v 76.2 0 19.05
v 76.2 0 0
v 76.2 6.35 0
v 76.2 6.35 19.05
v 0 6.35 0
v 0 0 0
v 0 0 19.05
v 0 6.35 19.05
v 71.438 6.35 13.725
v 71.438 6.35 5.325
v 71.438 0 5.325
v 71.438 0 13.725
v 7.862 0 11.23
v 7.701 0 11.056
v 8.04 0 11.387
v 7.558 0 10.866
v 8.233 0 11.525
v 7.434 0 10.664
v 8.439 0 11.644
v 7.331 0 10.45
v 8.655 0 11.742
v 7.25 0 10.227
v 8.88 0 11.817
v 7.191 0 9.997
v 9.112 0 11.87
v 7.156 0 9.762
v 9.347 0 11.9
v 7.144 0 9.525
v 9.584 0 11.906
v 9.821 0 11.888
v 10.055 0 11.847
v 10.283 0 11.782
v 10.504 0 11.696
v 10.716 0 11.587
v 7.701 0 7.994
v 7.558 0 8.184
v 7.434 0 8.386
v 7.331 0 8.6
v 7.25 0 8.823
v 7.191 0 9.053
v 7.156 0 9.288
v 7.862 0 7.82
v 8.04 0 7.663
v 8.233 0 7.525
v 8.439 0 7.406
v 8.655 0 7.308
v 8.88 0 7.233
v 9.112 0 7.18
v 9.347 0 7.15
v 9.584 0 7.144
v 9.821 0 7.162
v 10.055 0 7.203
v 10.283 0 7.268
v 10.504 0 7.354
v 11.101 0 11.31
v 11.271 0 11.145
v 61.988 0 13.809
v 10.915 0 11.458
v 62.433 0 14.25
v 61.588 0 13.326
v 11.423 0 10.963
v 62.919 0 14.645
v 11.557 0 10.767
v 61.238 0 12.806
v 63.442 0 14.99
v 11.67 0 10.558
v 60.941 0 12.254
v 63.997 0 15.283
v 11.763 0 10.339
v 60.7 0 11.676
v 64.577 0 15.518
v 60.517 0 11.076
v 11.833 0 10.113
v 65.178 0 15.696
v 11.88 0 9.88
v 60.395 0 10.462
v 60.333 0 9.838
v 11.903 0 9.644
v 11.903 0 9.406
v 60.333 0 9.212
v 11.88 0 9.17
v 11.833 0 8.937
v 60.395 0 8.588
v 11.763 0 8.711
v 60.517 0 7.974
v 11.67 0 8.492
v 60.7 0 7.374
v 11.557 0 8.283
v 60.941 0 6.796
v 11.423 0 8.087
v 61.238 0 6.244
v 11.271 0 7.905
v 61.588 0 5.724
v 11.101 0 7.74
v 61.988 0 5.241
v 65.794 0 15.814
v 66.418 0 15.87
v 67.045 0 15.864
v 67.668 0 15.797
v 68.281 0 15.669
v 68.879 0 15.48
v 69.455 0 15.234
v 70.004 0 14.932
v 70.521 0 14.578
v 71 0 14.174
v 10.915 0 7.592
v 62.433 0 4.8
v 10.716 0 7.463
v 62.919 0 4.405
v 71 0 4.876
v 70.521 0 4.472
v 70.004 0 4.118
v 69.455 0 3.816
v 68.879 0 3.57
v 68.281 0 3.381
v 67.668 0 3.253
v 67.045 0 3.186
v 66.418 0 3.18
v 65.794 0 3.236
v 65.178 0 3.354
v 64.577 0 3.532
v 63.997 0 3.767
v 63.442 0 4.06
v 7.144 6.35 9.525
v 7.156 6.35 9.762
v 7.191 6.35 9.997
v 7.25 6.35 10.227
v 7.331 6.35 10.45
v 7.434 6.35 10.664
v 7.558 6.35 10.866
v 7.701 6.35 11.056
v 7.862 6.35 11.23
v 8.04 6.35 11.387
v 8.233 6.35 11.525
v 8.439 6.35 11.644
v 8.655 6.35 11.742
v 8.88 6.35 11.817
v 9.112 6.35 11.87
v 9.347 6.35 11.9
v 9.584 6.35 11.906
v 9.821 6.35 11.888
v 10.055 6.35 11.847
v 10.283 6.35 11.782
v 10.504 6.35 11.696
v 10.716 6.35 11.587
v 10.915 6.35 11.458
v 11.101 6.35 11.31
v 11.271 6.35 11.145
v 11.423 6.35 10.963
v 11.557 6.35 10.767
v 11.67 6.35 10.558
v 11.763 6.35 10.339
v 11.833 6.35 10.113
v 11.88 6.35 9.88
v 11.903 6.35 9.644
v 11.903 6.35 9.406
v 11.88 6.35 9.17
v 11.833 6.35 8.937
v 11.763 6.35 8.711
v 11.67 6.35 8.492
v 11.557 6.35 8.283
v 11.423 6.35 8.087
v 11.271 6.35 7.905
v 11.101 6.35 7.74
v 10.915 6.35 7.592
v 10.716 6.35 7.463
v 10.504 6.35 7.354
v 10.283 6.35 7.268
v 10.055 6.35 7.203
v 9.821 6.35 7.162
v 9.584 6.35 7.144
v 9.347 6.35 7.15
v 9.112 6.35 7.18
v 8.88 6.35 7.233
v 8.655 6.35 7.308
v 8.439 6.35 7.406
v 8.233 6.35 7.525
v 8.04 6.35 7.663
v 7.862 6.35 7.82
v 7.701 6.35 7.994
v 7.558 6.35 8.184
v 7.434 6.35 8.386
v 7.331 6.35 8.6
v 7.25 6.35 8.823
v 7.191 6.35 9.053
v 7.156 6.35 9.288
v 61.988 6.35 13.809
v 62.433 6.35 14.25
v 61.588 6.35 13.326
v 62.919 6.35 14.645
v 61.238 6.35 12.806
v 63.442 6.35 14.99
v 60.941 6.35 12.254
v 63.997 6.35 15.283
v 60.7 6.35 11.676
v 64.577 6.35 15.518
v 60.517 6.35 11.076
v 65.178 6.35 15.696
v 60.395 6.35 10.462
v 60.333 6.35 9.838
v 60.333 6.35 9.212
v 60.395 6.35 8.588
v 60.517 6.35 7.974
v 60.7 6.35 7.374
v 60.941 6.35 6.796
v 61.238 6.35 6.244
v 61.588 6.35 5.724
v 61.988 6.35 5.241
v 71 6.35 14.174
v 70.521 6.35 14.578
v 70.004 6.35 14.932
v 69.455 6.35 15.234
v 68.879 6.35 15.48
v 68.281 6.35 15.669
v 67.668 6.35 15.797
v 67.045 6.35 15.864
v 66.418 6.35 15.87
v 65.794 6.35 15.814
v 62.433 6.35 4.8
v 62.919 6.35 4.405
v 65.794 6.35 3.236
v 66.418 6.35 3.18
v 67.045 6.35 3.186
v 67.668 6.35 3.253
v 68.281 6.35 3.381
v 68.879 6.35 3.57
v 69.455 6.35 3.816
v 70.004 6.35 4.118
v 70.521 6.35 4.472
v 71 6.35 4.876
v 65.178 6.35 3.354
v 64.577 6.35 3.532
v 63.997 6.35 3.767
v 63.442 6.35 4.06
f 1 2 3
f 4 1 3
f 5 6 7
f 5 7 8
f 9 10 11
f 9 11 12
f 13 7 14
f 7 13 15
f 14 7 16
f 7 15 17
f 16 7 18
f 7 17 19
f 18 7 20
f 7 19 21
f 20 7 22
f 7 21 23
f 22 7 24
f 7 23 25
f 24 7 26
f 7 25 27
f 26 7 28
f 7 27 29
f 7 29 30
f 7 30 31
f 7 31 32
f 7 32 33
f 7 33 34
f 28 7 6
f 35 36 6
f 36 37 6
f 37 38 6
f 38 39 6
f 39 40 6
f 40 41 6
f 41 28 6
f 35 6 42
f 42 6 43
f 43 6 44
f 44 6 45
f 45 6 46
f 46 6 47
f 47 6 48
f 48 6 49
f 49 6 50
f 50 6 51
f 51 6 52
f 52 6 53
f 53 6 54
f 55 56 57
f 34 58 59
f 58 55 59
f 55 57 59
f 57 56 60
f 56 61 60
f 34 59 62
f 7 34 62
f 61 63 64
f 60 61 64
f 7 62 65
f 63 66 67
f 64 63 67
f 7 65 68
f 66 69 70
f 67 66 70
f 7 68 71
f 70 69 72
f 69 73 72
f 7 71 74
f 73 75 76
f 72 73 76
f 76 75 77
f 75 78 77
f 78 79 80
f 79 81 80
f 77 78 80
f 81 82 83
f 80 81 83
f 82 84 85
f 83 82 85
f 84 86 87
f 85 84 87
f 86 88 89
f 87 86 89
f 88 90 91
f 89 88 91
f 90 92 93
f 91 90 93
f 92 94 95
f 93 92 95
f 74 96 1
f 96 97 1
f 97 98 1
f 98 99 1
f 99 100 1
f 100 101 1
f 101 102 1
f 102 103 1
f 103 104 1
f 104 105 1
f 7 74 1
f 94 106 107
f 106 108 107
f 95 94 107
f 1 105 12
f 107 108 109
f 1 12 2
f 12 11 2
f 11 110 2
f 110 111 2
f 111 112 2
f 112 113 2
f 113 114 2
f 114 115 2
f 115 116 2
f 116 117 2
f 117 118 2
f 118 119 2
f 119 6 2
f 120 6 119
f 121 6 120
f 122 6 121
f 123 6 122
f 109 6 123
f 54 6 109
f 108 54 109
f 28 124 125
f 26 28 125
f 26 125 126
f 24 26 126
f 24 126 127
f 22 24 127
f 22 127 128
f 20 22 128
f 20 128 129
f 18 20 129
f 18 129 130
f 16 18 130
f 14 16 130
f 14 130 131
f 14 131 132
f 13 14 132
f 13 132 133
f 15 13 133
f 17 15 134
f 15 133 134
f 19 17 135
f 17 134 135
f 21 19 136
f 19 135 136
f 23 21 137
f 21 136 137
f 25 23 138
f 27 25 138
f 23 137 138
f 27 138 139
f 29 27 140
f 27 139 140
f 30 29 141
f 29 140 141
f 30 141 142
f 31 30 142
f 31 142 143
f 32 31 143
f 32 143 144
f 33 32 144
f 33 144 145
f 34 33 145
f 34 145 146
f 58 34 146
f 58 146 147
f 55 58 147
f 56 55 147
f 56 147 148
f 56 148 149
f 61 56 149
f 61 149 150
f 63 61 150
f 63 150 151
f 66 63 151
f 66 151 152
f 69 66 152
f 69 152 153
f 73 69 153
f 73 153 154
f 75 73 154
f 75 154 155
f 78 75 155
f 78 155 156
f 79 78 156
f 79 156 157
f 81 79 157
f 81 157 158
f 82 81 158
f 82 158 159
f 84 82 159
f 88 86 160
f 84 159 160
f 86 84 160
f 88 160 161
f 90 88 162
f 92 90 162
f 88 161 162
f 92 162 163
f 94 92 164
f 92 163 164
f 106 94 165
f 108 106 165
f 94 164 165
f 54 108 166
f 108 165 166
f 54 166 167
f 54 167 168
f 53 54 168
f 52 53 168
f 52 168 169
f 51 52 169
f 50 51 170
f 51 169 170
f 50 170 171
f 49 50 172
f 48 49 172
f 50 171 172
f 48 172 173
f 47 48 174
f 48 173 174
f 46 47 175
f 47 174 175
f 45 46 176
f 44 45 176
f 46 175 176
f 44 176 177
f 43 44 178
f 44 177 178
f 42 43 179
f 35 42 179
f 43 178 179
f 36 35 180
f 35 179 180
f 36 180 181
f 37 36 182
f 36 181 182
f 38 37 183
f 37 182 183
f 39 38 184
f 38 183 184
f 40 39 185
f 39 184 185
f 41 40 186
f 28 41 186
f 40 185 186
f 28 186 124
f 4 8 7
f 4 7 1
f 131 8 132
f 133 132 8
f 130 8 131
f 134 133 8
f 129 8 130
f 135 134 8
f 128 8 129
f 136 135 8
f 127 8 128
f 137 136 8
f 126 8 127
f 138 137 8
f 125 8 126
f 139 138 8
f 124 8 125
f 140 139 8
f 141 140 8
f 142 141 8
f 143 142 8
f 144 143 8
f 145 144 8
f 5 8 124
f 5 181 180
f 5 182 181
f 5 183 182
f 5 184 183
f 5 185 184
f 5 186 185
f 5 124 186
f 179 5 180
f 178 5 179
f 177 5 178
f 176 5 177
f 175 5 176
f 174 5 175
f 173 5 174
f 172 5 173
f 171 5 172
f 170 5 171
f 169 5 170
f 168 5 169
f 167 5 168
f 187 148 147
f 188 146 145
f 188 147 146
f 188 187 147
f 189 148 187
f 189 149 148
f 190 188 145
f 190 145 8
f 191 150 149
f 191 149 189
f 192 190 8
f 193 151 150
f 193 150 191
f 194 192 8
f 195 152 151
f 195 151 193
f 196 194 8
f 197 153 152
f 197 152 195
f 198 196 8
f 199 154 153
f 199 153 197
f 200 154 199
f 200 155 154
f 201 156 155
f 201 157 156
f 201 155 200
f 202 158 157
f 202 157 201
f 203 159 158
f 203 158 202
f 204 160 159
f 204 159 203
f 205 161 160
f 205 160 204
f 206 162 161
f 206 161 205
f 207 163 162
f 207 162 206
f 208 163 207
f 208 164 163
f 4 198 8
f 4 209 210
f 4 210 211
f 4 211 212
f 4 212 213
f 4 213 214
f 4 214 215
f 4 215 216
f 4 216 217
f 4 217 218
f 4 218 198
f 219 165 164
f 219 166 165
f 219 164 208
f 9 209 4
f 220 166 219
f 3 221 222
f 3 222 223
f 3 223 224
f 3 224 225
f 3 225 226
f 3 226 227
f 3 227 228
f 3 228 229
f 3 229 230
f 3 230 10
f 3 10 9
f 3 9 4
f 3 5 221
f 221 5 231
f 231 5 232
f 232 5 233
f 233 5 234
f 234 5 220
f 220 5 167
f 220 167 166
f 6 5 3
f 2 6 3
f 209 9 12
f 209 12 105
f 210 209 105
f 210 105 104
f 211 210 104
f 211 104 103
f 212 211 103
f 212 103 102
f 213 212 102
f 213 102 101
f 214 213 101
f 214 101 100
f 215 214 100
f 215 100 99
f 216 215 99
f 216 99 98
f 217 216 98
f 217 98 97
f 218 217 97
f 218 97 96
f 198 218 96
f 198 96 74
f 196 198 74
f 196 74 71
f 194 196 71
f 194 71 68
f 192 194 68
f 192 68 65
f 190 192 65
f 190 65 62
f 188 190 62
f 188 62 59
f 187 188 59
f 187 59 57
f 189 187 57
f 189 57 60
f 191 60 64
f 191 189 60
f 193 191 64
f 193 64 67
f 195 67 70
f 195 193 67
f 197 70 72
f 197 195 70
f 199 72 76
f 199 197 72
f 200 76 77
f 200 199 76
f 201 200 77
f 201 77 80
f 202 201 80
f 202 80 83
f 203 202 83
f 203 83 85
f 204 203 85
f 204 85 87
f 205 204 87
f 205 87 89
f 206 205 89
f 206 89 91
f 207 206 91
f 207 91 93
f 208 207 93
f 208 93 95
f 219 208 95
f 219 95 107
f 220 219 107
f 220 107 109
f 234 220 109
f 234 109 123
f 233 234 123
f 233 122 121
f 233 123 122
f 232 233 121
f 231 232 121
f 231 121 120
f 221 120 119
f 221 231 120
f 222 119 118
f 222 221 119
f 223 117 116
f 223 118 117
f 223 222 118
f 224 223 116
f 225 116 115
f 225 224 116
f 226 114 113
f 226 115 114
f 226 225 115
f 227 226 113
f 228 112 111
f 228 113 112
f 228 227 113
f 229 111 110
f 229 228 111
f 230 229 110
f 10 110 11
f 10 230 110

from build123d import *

# Parameters (mm, degrees)
SKETCH1_W          = 76.2
SKETCH1_H          = 6.35
BASE_EXTRUDE_DEPTH = 19.05
CUT_EXTRUDE1_DEPTH = 7.35
SKETCH3_R          = 2.38125
CUT_EXTRUDE2_DEPTH = 7.35


with BuildPart() as part:
    # Sketch1 → Base-Extrude (new body)
    with BuildSketch(Plane.XY):
        with Locations((38.1, 3.175)):
            Rectangle(SKETCH1_W, SKETCH1_H)
    extrude(amount=BASE_EXTRUDE_DEPTH)

    # Sketch2 → Cut-Extrude1 (cut, through all)
    with BuildSketch(Plane(origin=(0, 6.35, 0), x_dir=(-1, 0, 0), z_dir=(0, 1, 0))):
        with BuildLine():
            Line((-71.4375, 5.324869794), (-71.4375, 13.725130206))
            ThreePointArc((-71.4375, 13.725130206), (-60.325, 9.525), (-71.4375, 5.324869794))
        make_face()
    extrude(amount=-CUT_EXTRUDE1_DEPTH, mode=Mode.SUBTRACT)

    # Sketch3 → Cut-Extrude2 (cut, through all)
    with BuildSketch(Plane(origin=(0, 6.35, 0), x_dir=(-1, 0, 0), z_dir=(0, 1, 0))):
        with Locations((-9.525, 9.525)):
            Circle(SKETCH3_R)
    extrude(amount=-CUT_EXTRUDE2_DEPTH, mode=Mode.SUBTRACT)


solid = part.part
